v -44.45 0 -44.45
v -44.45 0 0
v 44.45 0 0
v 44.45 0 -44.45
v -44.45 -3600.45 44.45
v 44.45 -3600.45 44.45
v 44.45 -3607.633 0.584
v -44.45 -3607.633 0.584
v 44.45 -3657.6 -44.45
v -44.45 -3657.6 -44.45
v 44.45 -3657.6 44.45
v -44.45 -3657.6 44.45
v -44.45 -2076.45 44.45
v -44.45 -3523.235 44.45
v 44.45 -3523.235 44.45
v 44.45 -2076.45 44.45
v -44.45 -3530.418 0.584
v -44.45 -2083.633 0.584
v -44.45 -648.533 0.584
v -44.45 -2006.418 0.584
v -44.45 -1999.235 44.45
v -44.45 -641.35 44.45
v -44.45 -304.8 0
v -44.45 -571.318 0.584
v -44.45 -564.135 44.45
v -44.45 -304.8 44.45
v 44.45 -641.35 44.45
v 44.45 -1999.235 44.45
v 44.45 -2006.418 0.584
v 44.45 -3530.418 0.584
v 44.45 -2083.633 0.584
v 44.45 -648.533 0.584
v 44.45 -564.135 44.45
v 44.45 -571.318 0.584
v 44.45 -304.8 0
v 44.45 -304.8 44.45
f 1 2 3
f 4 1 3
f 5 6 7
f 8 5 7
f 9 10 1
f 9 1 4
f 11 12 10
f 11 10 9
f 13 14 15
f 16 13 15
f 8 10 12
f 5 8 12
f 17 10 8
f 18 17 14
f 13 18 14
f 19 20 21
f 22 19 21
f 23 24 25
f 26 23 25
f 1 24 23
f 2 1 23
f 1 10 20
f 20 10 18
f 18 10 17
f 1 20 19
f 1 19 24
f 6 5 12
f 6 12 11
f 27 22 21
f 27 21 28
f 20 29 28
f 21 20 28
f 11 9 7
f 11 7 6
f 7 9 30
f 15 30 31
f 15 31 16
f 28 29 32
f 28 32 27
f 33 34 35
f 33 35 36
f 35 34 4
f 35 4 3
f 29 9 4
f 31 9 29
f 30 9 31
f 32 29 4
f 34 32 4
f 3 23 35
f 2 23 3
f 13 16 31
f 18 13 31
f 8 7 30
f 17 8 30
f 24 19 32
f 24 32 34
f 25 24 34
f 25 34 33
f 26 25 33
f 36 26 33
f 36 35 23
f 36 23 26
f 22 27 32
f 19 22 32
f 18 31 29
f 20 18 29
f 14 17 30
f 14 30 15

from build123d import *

# Parameters (mm, degrees)
F0_W     = 88.9
F0_H     = 88.9
F1_DEPTH = 3657.6
F2_W     = 304.8
F2_H     = 44.45
F3_DEPTH = 127


with BuildPart() as f1:
    # F0 (on Front) → F1 (new body)
    with BuildSketch(Plane.XZ):
        Rectangle(F0_W, F0_H)
    extrude(amount=F1_DEPTH)

    # F2 (on Right) → F3 (cut, symmetric)
    with BuildSketch(Plane.YZ):
        with Locations((-152.4, 22.225)):
            Rectangle(F2_W, F2_H)
        Polygon((-3523.2350649967, 44.45), (-3600.45, 44.45), (-3607.633289848, 0.5842634057), (-3530.4183548447, 0.5842634057), align=None)
        Polygon((-1999.2350649967, 44.45), (-2076.45, 44.45), (-2083.633289848, 0.5842634057), (-2006.4183548447, 0.5842634057), align=None)
        Polygon((-564.1350649967, 44.45), (-641.35, 44.45), (-648.533289848, 0.5842634057), (-571.3183548447, 0.5842634057), align=None)
    extrude(amount=F3_DEPTH, both=True, mode=Mode.SUBTRACT)


solid = f1.part
